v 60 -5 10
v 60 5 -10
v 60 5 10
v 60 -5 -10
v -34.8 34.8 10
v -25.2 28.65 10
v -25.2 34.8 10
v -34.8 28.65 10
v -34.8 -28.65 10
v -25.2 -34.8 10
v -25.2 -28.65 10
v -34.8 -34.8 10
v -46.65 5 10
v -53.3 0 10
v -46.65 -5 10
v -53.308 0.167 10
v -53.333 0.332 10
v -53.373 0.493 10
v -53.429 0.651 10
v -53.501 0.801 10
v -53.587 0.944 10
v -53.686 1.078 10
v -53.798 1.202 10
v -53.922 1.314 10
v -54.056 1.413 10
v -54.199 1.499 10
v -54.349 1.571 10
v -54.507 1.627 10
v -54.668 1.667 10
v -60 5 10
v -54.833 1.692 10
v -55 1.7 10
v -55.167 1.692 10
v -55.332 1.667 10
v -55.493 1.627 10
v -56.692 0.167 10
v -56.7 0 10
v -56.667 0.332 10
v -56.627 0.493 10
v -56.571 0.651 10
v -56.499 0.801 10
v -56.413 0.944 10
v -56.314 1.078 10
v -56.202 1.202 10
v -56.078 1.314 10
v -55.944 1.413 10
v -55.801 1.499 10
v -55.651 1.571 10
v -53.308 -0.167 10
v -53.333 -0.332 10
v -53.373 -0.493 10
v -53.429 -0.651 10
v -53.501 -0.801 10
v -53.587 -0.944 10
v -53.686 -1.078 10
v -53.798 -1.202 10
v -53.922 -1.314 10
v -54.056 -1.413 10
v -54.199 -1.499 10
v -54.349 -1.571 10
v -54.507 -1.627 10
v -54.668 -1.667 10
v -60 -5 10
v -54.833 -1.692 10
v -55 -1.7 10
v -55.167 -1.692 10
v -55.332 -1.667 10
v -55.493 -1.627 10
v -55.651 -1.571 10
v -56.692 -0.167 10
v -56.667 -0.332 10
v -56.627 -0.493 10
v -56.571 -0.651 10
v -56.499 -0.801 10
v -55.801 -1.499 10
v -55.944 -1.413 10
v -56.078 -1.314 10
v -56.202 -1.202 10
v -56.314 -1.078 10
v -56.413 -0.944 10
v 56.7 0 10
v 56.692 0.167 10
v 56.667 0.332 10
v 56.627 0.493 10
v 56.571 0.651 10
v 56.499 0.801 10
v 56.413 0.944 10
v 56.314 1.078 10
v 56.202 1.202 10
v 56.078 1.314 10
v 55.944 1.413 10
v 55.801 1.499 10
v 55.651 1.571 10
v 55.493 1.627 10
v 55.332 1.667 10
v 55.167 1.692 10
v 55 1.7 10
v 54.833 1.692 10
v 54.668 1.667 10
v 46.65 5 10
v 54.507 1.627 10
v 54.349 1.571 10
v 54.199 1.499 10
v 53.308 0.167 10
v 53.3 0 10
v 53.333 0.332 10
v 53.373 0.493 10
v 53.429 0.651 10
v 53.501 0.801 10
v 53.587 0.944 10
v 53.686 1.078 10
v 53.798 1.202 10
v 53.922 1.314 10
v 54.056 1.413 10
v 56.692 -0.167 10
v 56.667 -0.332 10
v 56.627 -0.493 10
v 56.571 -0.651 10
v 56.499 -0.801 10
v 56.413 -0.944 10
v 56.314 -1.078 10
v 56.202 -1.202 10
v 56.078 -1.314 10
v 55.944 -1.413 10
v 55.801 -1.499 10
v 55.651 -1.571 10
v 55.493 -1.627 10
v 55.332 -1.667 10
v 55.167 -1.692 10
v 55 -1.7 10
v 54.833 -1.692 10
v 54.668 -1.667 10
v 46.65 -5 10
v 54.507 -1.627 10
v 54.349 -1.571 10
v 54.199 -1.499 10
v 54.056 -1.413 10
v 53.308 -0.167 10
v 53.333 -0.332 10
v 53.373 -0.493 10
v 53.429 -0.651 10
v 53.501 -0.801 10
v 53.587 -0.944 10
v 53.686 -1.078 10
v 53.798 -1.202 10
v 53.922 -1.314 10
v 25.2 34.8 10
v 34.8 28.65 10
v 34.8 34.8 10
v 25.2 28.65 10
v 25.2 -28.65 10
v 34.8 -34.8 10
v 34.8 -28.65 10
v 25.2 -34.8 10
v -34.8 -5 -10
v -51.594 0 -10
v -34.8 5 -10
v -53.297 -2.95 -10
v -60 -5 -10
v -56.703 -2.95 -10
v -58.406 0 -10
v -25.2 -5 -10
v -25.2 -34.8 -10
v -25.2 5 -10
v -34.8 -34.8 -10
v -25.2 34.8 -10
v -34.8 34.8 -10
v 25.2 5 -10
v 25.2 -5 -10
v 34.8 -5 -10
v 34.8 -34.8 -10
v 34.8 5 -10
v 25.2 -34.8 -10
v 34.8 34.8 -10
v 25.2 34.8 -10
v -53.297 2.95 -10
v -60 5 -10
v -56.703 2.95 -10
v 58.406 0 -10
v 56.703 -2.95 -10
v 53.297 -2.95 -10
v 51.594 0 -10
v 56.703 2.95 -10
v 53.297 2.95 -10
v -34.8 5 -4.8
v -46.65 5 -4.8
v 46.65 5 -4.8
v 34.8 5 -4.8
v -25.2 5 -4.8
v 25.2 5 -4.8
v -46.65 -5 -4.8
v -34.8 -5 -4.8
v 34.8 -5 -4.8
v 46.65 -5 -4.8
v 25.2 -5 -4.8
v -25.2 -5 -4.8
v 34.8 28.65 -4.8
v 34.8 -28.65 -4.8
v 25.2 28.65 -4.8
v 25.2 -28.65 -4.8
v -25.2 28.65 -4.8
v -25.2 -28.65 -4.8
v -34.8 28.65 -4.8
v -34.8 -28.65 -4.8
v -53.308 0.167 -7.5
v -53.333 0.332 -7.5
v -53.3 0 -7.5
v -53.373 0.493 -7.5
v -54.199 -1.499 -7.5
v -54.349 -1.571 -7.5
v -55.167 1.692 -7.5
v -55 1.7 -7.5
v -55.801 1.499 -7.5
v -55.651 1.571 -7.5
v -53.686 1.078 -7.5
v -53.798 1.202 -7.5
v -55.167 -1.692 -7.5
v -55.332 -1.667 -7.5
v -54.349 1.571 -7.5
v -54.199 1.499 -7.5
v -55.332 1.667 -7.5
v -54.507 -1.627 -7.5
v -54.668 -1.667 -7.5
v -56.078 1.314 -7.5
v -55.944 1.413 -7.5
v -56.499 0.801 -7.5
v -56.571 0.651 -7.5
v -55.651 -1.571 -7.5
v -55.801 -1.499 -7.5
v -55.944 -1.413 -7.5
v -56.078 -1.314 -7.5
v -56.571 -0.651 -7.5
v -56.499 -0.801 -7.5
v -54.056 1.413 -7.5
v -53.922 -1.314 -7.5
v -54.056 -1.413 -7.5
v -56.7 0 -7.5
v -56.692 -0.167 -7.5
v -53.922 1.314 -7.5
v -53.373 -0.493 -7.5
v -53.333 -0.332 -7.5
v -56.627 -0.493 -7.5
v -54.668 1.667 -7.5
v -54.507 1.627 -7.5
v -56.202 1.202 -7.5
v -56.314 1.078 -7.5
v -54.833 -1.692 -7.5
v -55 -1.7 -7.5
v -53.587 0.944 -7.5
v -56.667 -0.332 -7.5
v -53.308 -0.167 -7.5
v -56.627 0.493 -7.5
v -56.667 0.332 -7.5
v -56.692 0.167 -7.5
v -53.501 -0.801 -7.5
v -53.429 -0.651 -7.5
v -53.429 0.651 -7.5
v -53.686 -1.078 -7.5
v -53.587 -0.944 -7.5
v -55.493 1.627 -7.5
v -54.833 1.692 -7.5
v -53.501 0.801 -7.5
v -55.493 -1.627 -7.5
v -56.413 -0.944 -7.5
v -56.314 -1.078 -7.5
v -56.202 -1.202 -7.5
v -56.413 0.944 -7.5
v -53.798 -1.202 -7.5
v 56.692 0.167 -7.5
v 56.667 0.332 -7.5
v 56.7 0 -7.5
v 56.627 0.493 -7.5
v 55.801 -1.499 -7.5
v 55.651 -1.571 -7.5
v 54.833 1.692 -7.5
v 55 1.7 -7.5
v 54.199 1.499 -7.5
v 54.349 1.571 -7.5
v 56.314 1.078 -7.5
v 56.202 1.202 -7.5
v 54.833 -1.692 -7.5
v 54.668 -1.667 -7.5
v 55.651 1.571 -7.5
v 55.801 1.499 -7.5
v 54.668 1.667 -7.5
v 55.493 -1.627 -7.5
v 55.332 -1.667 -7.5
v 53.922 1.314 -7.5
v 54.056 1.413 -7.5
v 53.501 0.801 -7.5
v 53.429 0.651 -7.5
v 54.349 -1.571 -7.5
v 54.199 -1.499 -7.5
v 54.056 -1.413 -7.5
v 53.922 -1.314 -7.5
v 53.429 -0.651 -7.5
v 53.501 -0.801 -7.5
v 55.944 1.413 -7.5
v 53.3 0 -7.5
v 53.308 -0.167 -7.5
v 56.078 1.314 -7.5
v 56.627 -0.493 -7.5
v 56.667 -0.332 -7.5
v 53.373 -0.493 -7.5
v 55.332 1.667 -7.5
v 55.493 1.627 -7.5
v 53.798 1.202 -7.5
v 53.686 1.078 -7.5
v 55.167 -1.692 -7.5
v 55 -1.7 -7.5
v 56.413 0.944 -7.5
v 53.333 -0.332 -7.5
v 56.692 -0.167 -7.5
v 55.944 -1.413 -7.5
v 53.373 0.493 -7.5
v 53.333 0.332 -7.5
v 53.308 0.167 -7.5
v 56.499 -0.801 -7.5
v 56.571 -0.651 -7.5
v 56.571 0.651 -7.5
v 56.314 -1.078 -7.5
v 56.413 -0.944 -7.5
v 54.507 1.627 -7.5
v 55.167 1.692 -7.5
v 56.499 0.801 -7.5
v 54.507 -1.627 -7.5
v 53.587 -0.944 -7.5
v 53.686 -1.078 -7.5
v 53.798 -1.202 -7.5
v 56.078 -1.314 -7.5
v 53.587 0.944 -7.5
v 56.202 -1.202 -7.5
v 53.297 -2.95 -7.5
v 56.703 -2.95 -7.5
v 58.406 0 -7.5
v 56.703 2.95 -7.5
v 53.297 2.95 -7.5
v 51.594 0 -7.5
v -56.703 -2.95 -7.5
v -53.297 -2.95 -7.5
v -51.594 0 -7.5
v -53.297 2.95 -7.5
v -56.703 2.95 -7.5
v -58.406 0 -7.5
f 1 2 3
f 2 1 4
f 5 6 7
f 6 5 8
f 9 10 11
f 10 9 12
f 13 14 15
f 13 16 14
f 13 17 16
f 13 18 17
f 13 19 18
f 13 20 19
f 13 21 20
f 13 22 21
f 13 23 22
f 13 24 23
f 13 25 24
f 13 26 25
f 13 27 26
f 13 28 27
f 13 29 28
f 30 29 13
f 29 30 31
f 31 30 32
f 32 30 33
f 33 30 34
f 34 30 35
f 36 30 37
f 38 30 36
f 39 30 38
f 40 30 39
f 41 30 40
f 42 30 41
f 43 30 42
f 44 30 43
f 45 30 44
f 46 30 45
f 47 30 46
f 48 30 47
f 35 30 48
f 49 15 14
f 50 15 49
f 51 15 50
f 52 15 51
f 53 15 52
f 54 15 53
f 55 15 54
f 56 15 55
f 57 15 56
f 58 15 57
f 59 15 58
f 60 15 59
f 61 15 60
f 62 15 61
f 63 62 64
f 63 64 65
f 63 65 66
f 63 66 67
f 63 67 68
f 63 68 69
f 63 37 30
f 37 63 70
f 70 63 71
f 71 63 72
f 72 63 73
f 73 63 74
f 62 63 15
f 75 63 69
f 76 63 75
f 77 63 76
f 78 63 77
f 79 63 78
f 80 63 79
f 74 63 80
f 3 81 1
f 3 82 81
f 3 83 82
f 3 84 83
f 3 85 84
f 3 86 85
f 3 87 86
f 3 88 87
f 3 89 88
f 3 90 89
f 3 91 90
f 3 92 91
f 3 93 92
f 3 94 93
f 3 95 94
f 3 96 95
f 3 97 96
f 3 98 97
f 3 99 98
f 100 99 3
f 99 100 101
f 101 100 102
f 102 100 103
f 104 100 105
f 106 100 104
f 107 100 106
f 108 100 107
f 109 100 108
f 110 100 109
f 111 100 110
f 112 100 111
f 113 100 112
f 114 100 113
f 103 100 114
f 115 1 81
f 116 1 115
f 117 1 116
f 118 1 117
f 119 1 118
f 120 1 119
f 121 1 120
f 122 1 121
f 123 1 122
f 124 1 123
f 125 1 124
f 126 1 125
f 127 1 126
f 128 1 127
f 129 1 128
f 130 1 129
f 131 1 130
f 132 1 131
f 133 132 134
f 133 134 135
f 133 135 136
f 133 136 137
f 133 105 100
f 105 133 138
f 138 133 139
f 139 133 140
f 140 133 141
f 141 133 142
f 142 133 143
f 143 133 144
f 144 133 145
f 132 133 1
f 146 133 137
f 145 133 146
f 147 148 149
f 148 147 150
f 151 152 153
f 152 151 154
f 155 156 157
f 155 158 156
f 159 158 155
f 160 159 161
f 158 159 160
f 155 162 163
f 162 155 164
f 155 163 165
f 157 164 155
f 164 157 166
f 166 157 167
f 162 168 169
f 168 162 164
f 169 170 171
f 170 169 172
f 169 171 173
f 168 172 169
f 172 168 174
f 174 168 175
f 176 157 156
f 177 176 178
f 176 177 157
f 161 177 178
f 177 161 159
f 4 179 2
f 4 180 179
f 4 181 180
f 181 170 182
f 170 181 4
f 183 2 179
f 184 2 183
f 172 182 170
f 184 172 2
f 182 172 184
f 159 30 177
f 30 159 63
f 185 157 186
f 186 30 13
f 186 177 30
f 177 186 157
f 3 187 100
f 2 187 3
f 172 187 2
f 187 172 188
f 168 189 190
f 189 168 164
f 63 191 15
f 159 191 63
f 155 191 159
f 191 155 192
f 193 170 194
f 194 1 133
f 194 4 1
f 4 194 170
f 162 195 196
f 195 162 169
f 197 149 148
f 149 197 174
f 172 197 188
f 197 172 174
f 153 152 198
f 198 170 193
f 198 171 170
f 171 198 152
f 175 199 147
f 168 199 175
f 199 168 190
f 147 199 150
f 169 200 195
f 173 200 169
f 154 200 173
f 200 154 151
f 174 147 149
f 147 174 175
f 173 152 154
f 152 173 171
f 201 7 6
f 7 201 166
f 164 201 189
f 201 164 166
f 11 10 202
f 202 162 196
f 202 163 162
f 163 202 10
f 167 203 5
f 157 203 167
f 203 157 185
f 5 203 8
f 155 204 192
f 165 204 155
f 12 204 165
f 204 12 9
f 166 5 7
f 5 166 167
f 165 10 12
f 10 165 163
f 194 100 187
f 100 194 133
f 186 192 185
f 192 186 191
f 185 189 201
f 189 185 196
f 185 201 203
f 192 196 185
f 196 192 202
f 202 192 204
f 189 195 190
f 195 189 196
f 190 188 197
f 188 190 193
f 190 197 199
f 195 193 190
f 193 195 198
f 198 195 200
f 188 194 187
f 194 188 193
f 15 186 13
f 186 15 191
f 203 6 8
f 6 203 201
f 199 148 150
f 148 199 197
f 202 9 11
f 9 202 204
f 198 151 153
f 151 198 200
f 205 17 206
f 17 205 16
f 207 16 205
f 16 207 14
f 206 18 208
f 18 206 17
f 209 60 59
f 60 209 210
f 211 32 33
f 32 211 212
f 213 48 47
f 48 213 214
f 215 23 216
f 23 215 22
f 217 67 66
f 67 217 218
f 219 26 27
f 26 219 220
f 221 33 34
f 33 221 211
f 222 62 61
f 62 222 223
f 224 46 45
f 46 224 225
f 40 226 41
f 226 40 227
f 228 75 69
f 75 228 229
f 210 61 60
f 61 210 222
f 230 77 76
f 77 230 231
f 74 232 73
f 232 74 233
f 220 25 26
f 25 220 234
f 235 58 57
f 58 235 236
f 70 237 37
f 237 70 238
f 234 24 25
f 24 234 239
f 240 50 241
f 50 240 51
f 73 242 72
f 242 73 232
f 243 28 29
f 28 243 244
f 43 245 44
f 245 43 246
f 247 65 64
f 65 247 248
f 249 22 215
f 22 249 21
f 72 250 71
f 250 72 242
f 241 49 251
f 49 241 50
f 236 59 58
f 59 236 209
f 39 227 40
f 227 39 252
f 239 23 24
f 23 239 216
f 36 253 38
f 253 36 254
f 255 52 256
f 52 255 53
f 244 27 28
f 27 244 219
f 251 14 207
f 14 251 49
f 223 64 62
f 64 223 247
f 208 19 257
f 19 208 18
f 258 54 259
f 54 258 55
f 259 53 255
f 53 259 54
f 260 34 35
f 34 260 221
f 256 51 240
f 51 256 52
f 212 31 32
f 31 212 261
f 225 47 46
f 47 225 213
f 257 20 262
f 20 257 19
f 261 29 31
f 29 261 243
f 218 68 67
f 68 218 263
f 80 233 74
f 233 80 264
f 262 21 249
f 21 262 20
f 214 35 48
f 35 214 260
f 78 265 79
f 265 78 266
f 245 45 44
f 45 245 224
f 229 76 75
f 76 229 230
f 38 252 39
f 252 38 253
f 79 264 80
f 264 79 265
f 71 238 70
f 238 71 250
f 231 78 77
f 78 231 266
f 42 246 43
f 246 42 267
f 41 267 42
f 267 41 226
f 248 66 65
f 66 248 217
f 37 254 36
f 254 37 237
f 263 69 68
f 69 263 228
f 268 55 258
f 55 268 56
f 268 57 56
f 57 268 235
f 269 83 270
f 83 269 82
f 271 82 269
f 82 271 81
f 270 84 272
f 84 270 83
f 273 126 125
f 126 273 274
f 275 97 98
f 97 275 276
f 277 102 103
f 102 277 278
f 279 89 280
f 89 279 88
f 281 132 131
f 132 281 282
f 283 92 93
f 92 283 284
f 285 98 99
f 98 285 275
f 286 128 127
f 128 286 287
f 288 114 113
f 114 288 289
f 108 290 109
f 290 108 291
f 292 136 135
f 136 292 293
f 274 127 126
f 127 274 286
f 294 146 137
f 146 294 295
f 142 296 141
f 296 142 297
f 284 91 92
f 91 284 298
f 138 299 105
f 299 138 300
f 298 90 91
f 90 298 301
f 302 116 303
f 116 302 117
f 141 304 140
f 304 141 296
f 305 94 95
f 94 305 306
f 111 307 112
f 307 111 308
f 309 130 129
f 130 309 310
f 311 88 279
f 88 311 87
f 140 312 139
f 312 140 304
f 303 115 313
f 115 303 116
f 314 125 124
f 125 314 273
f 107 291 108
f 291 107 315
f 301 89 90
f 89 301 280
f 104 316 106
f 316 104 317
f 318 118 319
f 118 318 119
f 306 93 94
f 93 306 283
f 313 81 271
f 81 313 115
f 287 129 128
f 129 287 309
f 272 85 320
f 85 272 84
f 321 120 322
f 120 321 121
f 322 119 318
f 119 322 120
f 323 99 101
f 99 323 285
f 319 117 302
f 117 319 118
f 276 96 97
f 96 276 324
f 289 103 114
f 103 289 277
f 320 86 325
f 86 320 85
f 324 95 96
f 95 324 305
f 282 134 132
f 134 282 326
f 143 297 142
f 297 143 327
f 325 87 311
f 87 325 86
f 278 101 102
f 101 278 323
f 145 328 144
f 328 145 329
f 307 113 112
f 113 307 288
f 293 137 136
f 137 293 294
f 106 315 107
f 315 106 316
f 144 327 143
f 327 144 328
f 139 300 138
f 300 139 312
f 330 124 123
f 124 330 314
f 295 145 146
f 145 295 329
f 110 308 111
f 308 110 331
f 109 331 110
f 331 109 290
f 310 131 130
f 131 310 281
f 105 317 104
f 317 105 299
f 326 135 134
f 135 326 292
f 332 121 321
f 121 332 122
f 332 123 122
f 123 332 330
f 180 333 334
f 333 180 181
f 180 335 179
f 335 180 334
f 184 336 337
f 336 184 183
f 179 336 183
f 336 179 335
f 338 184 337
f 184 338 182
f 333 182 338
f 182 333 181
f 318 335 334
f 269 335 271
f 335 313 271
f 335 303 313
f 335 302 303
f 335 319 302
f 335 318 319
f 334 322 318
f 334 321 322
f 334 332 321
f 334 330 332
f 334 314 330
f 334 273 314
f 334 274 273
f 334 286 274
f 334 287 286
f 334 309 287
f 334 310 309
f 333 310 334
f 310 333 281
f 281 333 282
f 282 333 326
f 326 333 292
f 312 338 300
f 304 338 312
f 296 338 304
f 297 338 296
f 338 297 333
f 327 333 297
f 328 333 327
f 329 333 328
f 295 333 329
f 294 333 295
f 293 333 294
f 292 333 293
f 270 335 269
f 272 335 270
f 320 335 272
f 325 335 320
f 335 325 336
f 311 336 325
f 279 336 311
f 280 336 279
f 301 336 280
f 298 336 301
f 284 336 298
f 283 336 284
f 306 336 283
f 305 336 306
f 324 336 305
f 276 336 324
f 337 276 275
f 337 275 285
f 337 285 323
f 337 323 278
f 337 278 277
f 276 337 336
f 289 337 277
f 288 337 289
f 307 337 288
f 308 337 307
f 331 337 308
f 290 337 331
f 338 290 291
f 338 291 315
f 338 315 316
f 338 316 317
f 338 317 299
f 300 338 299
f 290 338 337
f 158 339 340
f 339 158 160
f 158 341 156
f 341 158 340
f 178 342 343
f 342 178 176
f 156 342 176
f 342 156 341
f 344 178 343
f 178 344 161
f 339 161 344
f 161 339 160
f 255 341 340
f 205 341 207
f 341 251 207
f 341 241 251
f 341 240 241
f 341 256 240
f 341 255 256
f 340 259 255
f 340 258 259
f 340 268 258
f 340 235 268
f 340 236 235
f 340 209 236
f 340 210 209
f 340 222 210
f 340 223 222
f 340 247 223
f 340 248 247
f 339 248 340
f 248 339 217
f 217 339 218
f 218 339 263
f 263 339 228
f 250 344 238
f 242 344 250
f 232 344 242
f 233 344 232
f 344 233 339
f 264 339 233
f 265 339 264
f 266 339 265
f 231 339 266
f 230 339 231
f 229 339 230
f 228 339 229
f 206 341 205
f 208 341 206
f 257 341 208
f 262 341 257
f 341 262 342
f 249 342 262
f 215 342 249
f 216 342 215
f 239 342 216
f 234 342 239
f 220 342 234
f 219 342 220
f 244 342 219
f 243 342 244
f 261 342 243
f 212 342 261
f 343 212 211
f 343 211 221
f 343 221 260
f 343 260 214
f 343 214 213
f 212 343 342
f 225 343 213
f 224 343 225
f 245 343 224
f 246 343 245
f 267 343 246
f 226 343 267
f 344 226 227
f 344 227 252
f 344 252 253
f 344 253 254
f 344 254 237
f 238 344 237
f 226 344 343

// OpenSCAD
sidex=120;
sidey=10;
height=20;

difference() {
// Long side
union() {

cube([sidex,sidey,height], center=true);    
// Short side
translate([30, 0, 0])
    cube([9.6, 69.6, 20], center=true);   
translate([-30, 0, 0])
    cube([9.6, 69.6, 20], center=true);   

    }
    
translate([0, 0, 5.2])
    cube([93.3, 57.3, 20], center=true);  
translate([-55, 0, 0])
    cylinder(d=3.4, h=70,$fn=64,center=true); 

translate([55, 0, 0])
    cylinder(d=3.4, h=70,$fn=64,center=true); 
translate([55, 0, -10])
    cylinder(d=2*(5.5+0.4) / sqrt(3), h=5,$fn=6, center=true);
 
translate([-55, 0, -10])
    cylinder(d=2*(5.5+0.4) / sqrt(3), h=5,$fn=6, center=true);

}
